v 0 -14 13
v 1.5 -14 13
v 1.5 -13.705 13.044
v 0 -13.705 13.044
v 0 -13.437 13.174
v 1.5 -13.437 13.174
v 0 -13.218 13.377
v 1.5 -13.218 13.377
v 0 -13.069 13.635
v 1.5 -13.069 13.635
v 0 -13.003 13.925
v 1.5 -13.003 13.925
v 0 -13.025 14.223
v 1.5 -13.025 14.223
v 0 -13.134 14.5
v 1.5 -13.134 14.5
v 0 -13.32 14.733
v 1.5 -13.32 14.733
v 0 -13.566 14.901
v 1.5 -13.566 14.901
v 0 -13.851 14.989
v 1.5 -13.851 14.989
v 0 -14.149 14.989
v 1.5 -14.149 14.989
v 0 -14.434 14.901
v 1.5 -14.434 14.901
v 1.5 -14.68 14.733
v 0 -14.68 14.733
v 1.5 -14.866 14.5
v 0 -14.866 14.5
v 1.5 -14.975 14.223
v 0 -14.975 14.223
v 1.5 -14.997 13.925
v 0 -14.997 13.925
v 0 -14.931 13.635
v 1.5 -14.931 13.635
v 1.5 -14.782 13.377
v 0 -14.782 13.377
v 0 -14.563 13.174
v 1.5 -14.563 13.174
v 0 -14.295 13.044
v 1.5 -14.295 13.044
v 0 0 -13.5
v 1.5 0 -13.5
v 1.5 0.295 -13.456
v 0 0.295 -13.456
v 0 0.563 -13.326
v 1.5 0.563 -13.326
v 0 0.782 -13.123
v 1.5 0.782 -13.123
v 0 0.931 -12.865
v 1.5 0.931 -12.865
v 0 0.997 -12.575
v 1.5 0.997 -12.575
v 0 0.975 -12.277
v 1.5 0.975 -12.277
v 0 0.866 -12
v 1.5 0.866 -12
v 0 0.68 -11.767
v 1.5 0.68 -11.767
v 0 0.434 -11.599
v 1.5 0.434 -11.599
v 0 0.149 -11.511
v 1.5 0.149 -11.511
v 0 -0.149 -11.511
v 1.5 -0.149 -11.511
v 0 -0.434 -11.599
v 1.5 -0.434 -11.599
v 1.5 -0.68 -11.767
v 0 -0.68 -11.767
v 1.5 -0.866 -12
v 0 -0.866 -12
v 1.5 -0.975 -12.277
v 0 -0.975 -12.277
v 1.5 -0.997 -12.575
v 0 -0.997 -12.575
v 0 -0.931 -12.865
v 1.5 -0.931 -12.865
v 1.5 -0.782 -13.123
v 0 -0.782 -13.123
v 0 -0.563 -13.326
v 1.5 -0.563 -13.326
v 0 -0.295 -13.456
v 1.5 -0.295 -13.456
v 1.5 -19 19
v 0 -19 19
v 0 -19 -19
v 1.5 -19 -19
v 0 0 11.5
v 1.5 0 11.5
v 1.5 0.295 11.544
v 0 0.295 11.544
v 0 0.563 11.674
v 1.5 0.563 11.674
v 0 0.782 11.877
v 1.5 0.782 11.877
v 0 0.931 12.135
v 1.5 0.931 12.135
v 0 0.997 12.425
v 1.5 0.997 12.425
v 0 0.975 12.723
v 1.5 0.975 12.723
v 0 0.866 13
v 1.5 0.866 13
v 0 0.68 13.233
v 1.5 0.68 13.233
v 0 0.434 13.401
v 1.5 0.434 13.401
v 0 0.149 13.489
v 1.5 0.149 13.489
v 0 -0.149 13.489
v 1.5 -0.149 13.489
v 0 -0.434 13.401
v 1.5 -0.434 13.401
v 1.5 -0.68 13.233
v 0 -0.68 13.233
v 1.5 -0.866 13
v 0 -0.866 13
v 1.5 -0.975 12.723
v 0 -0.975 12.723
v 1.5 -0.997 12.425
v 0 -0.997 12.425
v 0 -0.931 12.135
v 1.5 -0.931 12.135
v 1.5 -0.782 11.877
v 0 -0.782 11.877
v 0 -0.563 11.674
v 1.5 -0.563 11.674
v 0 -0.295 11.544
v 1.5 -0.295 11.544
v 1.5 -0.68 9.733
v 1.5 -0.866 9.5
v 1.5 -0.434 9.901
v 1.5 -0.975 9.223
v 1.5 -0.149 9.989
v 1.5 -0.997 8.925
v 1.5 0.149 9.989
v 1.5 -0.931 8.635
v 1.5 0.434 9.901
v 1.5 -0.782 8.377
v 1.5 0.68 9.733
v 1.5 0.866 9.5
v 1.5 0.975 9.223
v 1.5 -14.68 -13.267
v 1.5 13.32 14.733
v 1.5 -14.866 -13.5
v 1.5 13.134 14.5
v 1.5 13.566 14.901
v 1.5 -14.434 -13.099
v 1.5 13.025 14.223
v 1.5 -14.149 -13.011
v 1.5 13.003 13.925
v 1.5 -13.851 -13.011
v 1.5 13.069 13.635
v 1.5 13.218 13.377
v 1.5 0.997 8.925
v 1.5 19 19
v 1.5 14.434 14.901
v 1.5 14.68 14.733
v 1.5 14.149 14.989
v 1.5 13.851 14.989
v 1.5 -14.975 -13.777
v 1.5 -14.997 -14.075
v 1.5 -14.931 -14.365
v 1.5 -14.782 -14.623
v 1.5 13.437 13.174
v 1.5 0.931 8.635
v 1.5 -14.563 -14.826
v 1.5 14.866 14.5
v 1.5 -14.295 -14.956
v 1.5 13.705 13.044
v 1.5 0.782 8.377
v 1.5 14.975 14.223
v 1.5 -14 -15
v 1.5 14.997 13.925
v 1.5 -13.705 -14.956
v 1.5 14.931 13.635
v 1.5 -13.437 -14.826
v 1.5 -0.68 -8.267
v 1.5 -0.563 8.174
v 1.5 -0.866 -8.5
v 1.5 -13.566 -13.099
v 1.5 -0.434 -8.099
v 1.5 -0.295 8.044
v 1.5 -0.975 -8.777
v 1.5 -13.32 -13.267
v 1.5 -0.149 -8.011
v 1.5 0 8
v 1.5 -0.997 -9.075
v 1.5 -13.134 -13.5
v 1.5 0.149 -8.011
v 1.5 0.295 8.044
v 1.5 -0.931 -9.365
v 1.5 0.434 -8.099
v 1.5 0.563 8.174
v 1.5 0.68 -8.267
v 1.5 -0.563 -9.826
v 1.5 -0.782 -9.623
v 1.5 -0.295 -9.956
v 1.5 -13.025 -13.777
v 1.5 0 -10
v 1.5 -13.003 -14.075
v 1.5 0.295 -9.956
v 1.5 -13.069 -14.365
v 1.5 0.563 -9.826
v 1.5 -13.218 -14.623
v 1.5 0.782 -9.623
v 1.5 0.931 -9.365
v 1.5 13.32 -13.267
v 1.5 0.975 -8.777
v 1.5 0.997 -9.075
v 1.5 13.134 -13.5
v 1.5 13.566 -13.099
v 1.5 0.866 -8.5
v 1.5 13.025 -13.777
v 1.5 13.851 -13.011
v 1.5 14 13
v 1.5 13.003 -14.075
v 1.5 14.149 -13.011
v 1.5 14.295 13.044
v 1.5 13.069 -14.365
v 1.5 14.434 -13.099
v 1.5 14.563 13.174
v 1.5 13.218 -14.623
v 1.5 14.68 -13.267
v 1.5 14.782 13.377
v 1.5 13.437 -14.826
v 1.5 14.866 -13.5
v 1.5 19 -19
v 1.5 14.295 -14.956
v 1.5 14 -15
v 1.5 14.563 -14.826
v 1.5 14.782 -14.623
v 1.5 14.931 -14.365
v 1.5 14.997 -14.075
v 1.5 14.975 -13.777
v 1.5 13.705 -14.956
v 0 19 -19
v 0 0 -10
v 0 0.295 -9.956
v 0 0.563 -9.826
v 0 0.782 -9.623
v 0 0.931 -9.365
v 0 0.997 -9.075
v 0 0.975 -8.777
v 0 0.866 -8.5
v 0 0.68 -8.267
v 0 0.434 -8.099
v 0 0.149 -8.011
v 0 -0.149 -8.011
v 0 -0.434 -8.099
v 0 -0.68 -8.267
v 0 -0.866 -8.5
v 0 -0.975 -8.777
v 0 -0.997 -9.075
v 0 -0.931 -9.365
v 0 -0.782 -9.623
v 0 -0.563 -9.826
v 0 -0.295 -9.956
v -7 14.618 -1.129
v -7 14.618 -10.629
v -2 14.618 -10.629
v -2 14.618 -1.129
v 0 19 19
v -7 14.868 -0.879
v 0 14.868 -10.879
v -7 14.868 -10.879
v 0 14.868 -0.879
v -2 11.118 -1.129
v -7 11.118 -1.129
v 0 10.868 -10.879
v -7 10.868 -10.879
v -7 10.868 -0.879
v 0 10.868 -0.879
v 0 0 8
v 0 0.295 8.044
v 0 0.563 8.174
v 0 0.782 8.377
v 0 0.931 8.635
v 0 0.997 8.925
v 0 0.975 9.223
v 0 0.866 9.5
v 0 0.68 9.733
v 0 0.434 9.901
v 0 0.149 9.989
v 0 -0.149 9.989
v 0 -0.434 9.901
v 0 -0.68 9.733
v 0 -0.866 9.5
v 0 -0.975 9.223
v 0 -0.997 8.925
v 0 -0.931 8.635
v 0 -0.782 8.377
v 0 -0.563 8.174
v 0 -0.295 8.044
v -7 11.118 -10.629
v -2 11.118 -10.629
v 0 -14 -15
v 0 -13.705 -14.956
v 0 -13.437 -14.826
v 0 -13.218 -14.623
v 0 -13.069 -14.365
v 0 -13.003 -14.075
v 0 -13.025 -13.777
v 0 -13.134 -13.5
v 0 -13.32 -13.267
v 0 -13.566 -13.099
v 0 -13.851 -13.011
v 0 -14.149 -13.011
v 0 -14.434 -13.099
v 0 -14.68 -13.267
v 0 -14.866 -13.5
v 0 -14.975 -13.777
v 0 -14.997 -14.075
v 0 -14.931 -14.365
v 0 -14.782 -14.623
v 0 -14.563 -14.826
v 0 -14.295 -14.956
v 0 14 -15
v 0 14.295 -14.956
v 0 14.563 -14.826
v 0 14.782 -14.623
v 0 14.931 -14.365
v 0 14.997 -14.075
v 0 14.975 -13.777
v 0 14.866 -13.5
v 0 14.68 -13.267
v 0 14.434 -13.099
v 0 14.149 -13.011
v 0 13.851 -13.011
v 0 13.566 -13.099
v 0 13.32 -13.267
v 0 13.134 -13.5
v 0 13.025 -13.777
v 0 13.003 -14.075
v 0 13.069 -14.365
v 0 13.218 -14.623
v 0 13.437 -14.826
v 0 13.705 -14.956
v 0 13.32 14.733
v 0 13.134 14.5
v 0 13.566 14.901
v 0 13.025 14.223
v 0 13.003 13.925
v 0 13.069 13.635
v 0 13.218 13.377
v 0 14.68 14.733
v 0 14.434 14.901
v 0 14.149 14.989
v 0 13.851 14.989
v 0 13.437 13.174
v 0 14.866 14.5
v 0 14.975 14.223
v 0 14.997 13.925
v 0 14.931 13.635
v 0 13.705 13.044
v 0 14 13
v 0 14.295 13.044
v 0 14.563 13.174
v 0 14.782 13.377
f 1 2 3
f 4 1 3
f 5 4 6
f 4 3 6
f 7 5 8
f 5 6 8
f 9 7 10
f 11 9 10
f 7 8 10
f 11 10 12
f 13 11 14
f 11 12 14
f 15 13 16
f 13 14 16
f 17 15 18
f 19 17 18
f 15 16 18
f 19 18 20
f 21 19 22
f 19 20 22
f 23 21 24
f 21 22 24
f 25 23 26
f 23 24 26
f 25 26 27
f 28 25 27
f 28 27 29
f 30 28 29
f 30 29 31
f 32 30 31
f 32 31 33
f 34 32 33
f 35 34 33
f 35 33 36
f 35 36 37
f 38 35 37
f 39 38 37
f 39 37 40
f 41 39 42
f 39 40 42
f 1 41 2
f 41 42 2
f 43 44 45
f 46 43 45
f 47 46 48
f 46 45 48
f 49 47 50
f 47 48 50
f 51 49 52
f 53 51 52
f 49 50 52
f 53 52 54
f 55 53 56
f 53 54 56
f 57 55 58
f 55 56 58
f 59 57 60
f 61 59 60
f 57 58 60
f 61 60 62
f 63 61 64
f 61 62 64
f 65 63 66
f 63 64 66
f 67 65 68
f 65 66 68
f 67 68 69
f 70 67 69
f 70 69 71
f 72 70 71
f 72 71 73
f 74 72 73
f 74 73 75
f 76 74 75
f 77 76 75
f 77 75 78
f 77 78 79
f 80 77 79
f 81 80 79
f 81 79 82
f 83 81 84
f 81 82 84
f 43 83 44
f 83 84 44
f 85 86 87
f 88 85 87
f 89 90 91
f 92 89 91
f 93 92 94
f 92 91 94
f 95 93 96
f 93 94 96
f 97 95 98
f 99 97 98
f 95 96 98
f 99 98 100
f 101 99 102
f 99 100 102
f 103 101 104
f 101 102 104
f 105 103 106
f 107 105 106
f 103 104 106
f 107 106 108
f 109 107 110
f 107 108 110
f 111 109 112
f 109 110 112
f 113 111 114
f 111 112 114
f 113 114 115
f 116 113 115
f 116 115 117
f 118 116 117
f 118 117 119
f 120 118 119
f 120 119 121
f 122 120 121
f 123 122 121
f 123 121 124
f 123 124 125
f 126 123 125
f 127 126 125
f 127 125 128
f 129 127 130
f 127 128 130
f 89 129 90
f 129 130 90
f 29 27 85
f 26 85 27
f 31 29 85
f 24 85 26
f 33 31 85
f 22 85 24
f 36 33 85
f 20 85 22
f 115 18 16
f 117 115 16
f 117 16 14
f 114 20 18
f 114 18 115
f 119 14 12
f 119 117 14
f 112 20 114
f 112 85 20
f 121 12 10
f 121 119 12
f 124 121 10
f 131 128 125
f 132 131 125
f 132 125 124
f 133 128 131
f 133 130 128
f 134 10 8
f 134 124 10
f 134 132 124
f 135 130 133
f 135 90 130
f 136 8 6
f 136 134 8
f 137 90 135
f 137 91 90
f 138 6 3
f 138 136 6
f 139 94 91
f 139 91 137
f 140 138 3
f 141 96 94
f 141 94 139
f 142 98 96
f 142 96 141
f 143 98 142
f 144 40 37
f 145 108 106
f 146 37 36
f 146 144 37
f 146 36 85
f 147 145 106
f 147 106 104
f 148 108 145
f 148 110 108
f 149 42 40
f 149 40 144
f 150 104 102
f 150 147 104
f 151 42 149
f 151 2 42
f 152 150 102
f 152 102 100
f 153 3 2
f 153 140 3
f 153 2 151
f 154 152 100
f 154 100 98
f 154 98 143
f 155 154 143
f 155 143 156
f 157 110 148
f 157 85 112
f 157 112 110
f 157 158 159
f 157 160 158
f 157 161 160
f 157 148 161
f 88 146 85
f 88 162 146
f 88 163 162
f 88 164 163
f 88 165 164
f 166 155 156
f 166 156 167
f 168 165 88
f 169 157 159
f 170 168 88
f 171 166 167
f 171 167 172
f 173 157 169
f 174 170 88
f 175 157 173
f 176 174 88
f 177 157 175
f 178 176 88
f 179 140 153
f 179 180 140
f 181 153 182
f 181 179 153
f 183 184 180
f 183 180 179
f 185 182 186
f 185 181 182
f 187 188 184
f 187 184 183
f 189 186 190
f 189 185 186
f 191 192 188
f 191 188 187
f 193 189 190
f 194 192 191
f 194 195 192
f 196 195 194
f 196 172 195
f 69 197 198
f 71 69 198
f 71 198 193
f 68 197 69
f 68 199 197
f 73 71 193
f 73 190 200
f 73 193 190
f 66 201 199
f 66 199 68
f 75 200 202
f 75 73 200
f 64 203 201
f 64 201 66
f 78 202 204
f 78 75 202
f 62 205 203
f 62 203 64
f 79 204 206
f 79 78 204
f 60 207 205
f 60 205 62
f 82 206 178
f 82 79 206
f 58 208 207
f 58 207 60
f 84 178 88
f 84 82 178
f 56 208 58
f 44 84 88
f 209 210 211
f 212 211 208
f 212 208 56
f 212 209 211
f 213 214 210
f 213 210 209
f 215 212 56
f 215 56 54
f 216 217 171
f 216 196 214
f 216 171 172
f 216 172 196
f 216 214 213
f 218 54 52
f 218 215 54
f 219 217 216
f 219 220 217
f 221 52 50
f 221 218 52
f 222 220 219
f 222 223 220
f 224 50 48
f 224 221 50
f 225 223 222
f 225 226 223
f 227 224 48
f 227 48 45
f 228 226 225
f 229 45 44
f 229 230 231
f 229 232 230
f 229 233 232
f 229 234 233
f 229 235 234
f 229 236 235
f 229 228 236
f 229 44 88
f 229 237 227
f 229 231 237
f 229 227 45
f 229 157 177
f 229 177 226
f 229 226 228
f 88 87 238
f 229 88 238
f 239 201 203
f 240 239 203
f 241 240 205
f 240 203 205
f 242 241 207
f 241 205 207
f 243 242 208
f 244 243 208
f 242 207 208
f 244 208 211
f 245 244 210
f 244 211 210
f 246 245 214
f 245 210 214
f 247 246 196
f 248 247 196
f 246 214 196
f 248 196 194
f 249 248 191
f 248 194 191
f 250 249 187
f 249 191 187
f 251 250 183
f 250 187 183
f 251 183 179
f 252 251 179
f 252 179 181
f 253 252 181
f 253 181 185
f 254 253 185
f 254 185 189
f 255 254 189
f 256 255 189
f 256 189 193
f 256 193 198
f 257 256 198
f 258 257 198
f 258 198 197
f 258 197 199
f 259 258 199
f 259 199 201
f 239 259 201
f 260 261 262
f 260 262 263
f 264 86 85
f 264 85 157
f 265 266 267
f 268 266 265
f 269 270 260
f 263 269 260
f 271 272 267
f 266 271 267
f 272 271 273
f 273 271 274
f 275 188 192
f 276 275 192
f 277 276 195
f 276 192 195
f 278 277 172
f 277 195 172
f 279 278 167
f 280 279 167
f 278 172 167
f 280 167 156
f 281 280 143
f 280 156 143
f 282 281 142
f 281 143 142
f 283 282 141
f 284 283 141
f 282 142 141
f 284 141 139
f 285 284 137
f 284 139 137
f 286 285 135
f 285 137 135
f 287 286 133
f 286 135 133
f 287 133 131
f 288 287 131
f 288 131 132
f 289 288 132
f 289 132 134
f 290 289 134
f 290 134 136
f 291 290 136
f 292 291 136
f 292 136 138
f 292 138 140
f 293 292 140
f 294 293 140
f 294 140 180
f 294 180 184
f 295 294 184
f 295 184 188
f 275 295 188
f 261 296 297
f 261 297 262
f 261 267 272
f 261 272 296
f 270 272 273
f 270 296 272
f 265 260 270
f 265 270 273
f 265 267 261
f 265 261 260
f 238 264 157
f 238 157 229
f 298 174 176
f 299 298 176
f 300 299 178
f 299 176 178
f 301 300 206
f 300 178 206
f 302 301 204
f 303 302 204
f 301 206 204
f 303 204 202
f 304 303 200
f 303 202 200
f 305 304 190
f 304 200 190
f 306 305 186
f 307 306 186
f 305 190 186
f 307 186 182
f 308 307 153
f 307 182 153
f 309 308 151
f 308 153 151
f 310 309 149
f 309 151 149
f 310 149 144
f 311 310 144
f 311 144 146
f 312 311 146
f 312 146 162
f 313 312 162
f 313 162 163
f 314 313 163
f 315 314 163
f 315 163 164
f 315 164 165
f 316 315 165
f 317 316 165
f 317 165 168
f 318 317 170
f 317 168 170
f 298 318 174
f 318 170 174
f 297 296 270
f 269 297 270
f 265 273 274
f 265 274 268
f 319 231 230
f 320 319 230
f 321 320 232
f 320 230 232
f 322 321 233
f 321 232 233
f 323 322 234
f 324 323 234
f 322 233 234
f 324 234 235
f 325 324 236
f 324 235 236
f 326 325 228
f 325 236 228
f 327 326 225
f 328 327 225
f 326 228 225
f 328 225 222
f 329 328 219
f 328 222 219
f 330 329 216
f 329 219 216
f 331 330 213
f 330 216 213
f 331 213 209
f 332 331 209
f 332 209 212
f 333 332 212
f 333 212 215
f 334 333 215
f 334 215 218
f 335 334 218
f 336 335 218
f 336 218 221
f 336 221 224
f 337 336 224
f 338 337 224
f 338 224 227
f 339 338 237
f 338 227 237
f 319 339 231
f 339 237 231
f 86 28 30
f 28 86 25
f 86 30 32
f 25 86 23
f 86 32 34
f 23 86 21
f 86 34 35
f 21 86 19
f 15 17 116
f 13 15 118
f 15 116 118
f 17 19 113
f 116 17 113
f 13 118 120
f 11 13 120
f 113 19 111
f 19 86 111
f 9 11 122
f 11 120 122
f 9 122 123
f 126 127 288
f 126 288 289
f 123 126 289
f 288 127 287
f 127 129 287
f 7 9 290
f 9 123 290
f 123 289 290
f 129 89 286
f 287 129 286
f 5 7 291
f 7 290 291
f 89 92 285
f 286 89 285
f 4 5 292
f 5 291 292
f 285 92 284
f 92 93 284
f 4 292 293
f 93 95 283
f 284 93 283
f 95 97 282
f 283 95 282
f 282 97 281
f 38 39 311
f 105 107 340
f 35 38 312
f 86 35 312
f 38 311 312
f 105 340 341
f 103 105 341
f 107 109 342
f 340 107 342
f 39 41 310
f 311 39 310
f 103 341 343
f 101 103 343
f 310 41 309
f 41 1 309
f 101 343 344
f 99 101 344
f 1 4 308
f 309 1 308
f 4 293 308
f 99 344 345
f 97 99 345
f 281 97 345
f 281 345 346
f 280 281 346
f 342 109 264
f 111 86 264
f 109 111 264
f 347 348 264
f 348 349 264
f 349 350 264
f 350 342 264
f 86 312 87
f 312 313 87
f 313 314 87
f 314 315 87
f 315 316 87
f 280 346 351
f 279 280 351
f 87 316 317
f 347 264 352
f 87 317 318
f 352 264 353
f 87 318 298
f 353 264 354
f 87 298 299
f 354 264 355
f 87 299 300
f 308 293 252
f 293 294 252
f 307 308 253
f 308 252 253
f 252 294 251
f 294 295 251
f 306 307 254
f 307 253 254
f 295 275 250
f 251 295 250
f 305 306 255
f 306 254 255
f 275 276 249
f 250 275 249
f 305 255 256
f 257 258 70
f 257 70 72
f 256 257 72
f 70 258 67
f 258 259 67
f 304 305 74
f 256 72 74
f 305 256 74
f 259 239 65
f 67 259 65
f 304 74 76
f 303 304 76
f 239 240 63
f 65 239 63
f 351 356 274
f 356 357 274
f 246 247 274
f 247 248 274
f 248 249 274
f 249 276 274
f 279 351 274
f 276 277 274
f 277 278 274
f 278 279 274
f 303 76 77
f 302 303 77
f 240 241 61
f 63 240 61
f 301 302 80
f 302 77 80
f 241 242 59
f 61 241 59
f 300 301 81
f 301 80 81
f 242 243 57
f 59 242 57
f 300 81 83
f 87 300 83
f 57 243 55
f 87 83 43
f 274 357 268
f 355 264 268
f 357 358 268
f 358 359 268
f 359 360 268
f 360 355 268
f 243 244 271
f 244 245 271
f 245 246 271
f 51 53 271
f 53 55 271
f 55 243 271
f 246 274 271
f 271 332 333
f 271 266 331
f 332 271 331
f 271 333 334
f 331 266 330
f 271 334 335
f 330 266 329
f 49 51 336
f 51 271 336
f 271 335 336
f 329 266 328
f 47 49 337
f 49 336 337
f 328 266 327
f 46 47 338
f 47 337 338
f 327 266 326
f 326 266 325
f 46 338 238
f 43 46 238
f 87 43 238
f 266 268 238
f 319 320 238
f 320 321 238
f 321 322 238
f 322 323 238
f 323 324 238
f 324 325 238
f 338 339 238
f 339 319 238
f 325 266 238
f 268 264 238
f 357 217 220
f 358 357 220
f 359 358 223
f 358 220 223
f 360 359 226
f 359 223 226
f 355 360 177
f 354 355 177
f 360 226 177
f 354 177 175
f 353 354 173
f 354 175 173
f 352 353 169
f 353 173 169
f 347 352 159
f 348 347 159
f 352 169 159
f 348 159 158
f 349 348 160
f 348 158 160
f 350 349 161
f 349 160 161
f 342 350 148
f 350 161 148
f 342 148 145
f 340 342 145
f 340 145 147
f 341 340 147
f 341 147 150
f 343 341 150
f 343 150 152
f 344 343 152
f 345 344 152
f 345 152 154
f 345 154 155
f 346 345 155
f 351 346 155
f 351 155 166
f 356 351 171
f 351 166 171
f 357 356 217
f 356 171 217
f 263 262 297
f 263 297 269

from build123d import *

# Parameters (mm, degrees)
SKETCH_1_W          = 38
SKETCH_1_H          = 38
EXTRUDE_1_DEPTH     = 1.5
SKETCH_2_R          = 1
CUT_EXTRUDE_1_DEPTH = 1.5
SKETCH_3_W          = 10
SKETCH_3_H          = 4
EXTRUDE_2_DEPTH     = 7
SKETCH_4_W          = 9.5
SKETCH_4_H          = 3.5
CUT_EXTRUDE_4_DEPTH = 5
SKETCH_6_R          = 1
CUT_EXTRUDE_6_DEPTH = 10


with BuildPart() as part:
    # 草图1 → 凸台-拉伸1 (new body)
    with BuildSketch(Plane(origin=(0, 0, 0), x_dir=(0, 0, -1), z_dir=(1, 0, 0))):
        Rectangle(SKETCH_1_W, SKETCH_1_H)
    extrude(amount=EXTRUDE_1_DEPTH)

    # 草图2 → 切除-拉伸1 (cut)
    with BuildSketch(Plane(origin=(1.5, 0, 0), x_dir=(0, 0, -1), z_dir=(1, 0, 0))):
        with Locations((-14, 14)):
            Circle(SKETCH_2_R)
        with Locations((-14, -14)):
            Circle(SKETCH_2_R)
        with Locations((14, -14)):
            Circle(SKETCH_2_R)
        with Locations((14, 14)):
            Circle(SKETCH_2_R)
        with Locations((-12.5, 0)):
            Circle(SKETCH_2_R)
        with Locations((12.5, 0)):
            Circle(SKETCH_2_R)
    extrude(amount=-CUT_EXTRUDE_1_DEPTH, mode=Mode.SUBTRACT)

    # 草图3 → 凸台-拉伸2 (add)
    with BuildSketch(Plane.ZY):
        with Locations((-5.878697065, 12.867552656)):
            Rectangle(SKETCH_3_W, SKETCH_3_H)
    extrude(amount=EXTRUDE_2_DEPTH)

    # 草图4 → 切除-拉伸4 (cut)
    with BuildSketch(Plane.ZY.offset(7)):
        with Locations((-5.878697065, 12.867552656)):
            Rectangle(SKETCH_4_W, SKETCH_4_H)
    extrude(amount=-CUT_EXTRUDE_4_DEPTH, mode=Mode.SUBTRACT)

    # 草图6 → 切除-拉伸6 (cut)
    with BuildSketch(Plane(origin=(1.5, 0, 0), x_dir=(0, 0, -1), z_dir=(1, 0, 0))):
        with Locations((-9, 0)):
            Circle(SKETCH_6_R)
        with Locations((9, 0)):
            Circle(SKETCH_6_R)
    extrude(amount=-CUT_EXTRUDE_6_DEPTH, mode=Mode.SUBTRACT)


solid = part.part
